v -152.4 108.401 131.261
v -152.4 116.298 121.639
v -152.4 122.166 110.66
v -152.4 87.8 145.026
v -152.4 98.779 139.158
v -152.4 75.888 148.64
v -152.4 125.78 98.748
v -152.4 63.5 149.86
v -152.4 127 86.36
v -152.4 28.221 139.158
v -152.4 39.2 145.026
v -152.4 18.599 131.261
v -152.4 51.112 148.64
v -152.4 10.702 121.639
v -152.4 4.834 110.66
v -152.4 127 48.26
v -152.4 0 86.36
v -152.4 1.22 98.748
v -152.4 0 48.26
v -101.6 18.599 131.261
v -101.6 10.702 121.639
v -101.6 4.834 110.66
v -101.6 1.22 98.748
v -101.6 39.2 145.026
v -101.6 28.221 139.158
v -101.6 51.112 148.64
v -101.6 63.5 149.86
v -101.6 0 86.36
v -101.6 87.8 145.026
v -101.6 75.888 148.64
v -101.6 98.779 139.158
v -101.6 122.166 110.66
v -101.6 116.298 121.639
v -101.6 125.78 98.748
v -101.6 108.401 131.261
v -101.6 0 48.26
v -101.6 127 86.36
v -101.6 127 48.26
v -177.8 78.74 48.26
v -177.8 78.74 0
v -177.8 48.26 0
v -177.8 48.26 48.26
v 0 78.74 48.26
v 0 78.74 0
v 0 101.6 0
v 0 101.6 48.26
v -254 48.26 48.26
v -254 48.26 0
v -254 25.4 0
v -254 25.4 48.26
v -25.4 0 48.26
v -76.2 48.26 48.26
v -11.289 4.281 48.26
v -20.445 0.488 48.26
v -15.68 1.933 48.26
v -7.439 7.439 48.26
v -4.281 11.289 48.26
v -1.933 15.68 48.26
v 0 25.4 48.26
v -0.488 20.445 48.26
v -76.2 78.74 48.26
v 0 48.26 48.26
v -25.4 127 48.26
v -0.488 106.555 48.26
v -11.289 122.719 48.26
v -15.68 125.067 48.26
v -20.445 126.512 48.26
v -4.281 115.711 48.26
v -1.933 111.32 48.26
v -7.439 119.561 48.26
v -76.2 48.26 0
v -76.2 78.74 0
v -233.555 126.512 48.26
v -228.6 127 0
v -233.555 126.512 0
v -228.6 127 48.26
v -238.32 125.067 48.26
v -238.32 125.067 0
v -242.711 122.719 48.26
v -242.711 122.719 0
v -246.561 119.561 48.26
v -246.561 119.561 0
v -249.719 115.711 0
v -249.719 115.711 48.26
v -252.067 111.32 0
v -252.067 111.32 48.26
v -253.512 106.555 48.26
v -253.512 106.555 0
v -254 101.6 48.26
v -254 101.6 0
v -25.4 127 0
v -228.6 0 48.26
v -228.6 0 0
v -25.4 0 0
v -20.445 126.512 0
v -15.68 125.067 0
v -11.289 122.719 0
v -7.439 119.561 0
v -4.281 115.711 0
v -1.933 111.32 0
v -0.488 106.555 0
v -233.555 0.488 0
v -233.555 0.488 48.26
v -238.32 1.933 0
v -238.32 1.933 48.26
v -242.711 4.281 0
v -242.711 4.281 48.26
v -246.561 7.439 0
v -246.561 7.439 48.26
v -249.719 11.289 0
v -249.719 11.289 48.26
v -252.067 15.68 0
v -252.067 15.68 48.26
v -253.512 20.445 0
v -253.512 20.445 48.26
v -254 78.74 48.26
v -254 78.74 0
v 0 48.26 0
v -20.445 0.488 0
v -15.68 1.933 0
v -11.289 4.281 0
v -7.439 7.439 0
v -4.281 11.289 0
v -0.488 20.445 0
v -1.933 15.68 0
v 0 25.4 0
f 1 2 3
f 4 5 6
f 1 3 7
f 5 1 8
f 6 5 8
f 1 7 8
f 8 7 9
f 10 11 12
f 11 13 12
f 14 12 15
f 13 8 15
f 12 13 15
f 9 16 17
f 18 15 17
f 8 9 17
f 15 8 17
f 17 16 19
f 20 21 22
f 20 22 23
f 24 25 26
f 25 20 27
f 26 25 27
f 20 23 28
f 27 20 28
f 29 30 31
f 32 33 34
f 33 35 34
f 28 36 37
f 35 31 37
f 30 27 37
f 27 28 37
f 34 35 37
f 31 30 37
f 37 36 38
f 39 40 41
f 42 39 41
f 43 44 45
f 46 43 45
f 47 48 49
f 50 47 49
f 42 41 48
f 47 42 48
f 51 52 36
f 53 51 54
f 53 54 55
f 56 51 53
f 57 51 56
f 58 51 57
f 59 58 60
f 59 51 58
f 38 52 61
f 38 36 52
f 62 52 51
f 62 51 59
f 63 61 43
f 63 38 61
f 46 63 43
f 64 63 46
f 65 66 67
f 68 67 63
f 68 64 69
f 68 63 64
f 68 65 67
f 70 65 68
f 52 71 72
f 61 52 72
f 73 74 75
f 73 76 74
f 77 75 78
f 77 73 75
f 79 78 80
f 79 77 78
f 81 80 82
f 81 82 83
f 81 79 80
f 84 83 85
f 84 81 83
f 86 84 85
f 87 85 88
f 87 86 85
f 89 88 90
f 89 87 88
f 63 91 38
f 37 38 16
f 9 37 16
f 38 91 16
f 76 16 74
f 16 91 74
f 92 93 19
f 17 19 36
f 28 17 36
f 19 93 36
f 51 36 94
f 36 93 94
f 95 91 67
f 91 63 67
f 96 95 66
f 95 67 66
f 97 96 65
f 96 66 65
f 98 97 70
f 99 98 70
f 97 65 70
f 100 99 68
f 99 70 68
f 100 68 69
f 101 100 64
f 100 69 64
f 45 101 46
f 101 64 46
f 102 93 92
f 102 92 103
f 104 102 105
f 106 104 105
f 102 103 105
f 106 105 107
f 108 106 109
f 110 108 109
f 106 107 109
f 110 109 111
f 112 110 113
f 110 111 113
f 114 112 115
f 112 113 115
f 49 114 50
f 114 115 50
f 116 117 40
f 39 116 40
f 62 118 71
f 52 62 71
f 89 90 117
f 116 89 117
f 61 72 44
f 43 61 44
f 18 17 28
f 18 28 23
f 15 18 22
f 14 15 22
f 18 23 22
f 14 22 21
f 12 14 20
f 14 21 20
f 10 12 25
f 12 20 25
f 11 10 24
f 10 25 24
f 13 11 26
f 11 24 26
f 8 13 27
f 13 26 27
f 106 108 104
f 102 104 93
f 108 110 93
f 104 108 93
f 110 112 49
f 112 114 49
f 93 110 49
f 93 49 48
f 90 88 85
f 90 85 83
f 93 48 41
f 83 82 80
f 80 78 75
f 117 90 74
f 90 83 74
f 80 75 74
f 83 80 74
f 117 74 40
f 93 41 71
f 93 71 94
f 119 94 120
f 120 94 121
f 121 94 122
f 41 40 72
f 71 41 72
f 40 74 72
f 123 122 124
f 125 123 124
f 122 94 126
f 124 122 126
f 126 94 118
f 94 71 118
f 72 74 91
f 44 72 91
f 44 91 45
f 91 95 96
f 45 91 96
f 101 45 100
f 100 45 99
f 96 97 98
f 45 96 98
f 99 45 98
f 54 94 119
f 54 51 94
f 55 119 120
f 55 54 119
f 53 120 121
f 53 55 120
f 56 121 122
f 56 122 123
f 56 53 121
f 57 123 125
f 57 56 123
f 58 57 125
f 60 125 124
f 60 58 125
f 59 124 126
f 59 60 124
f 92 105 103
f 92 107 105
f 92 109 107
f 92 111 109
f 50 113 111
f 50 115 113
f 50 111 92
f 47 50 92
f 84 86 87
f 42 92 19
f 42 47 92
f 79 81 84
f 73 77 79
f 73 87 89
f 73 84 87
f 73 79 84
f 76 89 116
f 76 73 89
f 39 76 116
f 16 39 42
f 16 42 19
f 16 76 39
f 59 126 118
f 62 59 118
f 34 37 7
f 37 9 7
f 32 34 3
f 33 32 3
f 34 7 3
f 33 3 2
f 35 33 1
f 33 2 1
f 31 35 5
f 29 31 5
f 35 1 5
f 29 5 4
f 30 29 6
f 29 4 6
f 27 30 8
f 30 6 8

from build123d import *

# Parameters (mm, degrees)
F1_DEPTH = 48.26
F3_DEPTH = 101.6
F4_R     = 63.49999
F5_R     = 25.4


# Not quite as in the source:
# - a fillet or chamfer is up to 0.001 mm smaller than in the source, because OpenCascade refuses the exact size
# - a feature names something its author has since deleted; it is built from what else it names


with BuildPart() as f1:
    # F0 (on Top) → F1 (new body)
    with BuildSketch(Plane.XY):
        Polygon((-254, 0), (0, 0), (0, 48.26), (-76.2, 48.26), (-76.2, 78.74), (0, 78.74), (0, 127), (-101.6, 127), (-152.4, 127), (-254, 127), (-254, 78.74), (-177.8, 78.74), (-177.8, 48.26), (-254, 48.26), align=None)
    extrude(amount=F1_DEPTH)

    # F2 (on face) → F3 (join)
    with BuildSketch(Plane.XY.offset(48.26)):
        Polygon((-101.6, 127), (-127, 127), (-152.4, 127), (-152.4, 0), (-101.6, 0), align=None)
    extrude(amount=F3_DEPTH)

    # F4 (radius 63.5 in the source; OpenCascade refuses exactly that, so slightly less here)
    f4_edges = [f1.edges().sort_by_distance(p)[0] for p in [
        (-127, 0, 149.86),
        (-127, 127, 149.86),
    ]]
    fillet(f4_edges, radius=F4_R)

    # F5
    f5_edges = [f1.edges().sort_by_distance(p)[0] for p in [
        (-254, 0, 24.13),
        (0, 0, 24.13),
        (-254, 127, 24.13),
        (0, 127, 24.13),
    ]]
    fillet(f5_edges, radius=F5_R)


solid = f1.part
